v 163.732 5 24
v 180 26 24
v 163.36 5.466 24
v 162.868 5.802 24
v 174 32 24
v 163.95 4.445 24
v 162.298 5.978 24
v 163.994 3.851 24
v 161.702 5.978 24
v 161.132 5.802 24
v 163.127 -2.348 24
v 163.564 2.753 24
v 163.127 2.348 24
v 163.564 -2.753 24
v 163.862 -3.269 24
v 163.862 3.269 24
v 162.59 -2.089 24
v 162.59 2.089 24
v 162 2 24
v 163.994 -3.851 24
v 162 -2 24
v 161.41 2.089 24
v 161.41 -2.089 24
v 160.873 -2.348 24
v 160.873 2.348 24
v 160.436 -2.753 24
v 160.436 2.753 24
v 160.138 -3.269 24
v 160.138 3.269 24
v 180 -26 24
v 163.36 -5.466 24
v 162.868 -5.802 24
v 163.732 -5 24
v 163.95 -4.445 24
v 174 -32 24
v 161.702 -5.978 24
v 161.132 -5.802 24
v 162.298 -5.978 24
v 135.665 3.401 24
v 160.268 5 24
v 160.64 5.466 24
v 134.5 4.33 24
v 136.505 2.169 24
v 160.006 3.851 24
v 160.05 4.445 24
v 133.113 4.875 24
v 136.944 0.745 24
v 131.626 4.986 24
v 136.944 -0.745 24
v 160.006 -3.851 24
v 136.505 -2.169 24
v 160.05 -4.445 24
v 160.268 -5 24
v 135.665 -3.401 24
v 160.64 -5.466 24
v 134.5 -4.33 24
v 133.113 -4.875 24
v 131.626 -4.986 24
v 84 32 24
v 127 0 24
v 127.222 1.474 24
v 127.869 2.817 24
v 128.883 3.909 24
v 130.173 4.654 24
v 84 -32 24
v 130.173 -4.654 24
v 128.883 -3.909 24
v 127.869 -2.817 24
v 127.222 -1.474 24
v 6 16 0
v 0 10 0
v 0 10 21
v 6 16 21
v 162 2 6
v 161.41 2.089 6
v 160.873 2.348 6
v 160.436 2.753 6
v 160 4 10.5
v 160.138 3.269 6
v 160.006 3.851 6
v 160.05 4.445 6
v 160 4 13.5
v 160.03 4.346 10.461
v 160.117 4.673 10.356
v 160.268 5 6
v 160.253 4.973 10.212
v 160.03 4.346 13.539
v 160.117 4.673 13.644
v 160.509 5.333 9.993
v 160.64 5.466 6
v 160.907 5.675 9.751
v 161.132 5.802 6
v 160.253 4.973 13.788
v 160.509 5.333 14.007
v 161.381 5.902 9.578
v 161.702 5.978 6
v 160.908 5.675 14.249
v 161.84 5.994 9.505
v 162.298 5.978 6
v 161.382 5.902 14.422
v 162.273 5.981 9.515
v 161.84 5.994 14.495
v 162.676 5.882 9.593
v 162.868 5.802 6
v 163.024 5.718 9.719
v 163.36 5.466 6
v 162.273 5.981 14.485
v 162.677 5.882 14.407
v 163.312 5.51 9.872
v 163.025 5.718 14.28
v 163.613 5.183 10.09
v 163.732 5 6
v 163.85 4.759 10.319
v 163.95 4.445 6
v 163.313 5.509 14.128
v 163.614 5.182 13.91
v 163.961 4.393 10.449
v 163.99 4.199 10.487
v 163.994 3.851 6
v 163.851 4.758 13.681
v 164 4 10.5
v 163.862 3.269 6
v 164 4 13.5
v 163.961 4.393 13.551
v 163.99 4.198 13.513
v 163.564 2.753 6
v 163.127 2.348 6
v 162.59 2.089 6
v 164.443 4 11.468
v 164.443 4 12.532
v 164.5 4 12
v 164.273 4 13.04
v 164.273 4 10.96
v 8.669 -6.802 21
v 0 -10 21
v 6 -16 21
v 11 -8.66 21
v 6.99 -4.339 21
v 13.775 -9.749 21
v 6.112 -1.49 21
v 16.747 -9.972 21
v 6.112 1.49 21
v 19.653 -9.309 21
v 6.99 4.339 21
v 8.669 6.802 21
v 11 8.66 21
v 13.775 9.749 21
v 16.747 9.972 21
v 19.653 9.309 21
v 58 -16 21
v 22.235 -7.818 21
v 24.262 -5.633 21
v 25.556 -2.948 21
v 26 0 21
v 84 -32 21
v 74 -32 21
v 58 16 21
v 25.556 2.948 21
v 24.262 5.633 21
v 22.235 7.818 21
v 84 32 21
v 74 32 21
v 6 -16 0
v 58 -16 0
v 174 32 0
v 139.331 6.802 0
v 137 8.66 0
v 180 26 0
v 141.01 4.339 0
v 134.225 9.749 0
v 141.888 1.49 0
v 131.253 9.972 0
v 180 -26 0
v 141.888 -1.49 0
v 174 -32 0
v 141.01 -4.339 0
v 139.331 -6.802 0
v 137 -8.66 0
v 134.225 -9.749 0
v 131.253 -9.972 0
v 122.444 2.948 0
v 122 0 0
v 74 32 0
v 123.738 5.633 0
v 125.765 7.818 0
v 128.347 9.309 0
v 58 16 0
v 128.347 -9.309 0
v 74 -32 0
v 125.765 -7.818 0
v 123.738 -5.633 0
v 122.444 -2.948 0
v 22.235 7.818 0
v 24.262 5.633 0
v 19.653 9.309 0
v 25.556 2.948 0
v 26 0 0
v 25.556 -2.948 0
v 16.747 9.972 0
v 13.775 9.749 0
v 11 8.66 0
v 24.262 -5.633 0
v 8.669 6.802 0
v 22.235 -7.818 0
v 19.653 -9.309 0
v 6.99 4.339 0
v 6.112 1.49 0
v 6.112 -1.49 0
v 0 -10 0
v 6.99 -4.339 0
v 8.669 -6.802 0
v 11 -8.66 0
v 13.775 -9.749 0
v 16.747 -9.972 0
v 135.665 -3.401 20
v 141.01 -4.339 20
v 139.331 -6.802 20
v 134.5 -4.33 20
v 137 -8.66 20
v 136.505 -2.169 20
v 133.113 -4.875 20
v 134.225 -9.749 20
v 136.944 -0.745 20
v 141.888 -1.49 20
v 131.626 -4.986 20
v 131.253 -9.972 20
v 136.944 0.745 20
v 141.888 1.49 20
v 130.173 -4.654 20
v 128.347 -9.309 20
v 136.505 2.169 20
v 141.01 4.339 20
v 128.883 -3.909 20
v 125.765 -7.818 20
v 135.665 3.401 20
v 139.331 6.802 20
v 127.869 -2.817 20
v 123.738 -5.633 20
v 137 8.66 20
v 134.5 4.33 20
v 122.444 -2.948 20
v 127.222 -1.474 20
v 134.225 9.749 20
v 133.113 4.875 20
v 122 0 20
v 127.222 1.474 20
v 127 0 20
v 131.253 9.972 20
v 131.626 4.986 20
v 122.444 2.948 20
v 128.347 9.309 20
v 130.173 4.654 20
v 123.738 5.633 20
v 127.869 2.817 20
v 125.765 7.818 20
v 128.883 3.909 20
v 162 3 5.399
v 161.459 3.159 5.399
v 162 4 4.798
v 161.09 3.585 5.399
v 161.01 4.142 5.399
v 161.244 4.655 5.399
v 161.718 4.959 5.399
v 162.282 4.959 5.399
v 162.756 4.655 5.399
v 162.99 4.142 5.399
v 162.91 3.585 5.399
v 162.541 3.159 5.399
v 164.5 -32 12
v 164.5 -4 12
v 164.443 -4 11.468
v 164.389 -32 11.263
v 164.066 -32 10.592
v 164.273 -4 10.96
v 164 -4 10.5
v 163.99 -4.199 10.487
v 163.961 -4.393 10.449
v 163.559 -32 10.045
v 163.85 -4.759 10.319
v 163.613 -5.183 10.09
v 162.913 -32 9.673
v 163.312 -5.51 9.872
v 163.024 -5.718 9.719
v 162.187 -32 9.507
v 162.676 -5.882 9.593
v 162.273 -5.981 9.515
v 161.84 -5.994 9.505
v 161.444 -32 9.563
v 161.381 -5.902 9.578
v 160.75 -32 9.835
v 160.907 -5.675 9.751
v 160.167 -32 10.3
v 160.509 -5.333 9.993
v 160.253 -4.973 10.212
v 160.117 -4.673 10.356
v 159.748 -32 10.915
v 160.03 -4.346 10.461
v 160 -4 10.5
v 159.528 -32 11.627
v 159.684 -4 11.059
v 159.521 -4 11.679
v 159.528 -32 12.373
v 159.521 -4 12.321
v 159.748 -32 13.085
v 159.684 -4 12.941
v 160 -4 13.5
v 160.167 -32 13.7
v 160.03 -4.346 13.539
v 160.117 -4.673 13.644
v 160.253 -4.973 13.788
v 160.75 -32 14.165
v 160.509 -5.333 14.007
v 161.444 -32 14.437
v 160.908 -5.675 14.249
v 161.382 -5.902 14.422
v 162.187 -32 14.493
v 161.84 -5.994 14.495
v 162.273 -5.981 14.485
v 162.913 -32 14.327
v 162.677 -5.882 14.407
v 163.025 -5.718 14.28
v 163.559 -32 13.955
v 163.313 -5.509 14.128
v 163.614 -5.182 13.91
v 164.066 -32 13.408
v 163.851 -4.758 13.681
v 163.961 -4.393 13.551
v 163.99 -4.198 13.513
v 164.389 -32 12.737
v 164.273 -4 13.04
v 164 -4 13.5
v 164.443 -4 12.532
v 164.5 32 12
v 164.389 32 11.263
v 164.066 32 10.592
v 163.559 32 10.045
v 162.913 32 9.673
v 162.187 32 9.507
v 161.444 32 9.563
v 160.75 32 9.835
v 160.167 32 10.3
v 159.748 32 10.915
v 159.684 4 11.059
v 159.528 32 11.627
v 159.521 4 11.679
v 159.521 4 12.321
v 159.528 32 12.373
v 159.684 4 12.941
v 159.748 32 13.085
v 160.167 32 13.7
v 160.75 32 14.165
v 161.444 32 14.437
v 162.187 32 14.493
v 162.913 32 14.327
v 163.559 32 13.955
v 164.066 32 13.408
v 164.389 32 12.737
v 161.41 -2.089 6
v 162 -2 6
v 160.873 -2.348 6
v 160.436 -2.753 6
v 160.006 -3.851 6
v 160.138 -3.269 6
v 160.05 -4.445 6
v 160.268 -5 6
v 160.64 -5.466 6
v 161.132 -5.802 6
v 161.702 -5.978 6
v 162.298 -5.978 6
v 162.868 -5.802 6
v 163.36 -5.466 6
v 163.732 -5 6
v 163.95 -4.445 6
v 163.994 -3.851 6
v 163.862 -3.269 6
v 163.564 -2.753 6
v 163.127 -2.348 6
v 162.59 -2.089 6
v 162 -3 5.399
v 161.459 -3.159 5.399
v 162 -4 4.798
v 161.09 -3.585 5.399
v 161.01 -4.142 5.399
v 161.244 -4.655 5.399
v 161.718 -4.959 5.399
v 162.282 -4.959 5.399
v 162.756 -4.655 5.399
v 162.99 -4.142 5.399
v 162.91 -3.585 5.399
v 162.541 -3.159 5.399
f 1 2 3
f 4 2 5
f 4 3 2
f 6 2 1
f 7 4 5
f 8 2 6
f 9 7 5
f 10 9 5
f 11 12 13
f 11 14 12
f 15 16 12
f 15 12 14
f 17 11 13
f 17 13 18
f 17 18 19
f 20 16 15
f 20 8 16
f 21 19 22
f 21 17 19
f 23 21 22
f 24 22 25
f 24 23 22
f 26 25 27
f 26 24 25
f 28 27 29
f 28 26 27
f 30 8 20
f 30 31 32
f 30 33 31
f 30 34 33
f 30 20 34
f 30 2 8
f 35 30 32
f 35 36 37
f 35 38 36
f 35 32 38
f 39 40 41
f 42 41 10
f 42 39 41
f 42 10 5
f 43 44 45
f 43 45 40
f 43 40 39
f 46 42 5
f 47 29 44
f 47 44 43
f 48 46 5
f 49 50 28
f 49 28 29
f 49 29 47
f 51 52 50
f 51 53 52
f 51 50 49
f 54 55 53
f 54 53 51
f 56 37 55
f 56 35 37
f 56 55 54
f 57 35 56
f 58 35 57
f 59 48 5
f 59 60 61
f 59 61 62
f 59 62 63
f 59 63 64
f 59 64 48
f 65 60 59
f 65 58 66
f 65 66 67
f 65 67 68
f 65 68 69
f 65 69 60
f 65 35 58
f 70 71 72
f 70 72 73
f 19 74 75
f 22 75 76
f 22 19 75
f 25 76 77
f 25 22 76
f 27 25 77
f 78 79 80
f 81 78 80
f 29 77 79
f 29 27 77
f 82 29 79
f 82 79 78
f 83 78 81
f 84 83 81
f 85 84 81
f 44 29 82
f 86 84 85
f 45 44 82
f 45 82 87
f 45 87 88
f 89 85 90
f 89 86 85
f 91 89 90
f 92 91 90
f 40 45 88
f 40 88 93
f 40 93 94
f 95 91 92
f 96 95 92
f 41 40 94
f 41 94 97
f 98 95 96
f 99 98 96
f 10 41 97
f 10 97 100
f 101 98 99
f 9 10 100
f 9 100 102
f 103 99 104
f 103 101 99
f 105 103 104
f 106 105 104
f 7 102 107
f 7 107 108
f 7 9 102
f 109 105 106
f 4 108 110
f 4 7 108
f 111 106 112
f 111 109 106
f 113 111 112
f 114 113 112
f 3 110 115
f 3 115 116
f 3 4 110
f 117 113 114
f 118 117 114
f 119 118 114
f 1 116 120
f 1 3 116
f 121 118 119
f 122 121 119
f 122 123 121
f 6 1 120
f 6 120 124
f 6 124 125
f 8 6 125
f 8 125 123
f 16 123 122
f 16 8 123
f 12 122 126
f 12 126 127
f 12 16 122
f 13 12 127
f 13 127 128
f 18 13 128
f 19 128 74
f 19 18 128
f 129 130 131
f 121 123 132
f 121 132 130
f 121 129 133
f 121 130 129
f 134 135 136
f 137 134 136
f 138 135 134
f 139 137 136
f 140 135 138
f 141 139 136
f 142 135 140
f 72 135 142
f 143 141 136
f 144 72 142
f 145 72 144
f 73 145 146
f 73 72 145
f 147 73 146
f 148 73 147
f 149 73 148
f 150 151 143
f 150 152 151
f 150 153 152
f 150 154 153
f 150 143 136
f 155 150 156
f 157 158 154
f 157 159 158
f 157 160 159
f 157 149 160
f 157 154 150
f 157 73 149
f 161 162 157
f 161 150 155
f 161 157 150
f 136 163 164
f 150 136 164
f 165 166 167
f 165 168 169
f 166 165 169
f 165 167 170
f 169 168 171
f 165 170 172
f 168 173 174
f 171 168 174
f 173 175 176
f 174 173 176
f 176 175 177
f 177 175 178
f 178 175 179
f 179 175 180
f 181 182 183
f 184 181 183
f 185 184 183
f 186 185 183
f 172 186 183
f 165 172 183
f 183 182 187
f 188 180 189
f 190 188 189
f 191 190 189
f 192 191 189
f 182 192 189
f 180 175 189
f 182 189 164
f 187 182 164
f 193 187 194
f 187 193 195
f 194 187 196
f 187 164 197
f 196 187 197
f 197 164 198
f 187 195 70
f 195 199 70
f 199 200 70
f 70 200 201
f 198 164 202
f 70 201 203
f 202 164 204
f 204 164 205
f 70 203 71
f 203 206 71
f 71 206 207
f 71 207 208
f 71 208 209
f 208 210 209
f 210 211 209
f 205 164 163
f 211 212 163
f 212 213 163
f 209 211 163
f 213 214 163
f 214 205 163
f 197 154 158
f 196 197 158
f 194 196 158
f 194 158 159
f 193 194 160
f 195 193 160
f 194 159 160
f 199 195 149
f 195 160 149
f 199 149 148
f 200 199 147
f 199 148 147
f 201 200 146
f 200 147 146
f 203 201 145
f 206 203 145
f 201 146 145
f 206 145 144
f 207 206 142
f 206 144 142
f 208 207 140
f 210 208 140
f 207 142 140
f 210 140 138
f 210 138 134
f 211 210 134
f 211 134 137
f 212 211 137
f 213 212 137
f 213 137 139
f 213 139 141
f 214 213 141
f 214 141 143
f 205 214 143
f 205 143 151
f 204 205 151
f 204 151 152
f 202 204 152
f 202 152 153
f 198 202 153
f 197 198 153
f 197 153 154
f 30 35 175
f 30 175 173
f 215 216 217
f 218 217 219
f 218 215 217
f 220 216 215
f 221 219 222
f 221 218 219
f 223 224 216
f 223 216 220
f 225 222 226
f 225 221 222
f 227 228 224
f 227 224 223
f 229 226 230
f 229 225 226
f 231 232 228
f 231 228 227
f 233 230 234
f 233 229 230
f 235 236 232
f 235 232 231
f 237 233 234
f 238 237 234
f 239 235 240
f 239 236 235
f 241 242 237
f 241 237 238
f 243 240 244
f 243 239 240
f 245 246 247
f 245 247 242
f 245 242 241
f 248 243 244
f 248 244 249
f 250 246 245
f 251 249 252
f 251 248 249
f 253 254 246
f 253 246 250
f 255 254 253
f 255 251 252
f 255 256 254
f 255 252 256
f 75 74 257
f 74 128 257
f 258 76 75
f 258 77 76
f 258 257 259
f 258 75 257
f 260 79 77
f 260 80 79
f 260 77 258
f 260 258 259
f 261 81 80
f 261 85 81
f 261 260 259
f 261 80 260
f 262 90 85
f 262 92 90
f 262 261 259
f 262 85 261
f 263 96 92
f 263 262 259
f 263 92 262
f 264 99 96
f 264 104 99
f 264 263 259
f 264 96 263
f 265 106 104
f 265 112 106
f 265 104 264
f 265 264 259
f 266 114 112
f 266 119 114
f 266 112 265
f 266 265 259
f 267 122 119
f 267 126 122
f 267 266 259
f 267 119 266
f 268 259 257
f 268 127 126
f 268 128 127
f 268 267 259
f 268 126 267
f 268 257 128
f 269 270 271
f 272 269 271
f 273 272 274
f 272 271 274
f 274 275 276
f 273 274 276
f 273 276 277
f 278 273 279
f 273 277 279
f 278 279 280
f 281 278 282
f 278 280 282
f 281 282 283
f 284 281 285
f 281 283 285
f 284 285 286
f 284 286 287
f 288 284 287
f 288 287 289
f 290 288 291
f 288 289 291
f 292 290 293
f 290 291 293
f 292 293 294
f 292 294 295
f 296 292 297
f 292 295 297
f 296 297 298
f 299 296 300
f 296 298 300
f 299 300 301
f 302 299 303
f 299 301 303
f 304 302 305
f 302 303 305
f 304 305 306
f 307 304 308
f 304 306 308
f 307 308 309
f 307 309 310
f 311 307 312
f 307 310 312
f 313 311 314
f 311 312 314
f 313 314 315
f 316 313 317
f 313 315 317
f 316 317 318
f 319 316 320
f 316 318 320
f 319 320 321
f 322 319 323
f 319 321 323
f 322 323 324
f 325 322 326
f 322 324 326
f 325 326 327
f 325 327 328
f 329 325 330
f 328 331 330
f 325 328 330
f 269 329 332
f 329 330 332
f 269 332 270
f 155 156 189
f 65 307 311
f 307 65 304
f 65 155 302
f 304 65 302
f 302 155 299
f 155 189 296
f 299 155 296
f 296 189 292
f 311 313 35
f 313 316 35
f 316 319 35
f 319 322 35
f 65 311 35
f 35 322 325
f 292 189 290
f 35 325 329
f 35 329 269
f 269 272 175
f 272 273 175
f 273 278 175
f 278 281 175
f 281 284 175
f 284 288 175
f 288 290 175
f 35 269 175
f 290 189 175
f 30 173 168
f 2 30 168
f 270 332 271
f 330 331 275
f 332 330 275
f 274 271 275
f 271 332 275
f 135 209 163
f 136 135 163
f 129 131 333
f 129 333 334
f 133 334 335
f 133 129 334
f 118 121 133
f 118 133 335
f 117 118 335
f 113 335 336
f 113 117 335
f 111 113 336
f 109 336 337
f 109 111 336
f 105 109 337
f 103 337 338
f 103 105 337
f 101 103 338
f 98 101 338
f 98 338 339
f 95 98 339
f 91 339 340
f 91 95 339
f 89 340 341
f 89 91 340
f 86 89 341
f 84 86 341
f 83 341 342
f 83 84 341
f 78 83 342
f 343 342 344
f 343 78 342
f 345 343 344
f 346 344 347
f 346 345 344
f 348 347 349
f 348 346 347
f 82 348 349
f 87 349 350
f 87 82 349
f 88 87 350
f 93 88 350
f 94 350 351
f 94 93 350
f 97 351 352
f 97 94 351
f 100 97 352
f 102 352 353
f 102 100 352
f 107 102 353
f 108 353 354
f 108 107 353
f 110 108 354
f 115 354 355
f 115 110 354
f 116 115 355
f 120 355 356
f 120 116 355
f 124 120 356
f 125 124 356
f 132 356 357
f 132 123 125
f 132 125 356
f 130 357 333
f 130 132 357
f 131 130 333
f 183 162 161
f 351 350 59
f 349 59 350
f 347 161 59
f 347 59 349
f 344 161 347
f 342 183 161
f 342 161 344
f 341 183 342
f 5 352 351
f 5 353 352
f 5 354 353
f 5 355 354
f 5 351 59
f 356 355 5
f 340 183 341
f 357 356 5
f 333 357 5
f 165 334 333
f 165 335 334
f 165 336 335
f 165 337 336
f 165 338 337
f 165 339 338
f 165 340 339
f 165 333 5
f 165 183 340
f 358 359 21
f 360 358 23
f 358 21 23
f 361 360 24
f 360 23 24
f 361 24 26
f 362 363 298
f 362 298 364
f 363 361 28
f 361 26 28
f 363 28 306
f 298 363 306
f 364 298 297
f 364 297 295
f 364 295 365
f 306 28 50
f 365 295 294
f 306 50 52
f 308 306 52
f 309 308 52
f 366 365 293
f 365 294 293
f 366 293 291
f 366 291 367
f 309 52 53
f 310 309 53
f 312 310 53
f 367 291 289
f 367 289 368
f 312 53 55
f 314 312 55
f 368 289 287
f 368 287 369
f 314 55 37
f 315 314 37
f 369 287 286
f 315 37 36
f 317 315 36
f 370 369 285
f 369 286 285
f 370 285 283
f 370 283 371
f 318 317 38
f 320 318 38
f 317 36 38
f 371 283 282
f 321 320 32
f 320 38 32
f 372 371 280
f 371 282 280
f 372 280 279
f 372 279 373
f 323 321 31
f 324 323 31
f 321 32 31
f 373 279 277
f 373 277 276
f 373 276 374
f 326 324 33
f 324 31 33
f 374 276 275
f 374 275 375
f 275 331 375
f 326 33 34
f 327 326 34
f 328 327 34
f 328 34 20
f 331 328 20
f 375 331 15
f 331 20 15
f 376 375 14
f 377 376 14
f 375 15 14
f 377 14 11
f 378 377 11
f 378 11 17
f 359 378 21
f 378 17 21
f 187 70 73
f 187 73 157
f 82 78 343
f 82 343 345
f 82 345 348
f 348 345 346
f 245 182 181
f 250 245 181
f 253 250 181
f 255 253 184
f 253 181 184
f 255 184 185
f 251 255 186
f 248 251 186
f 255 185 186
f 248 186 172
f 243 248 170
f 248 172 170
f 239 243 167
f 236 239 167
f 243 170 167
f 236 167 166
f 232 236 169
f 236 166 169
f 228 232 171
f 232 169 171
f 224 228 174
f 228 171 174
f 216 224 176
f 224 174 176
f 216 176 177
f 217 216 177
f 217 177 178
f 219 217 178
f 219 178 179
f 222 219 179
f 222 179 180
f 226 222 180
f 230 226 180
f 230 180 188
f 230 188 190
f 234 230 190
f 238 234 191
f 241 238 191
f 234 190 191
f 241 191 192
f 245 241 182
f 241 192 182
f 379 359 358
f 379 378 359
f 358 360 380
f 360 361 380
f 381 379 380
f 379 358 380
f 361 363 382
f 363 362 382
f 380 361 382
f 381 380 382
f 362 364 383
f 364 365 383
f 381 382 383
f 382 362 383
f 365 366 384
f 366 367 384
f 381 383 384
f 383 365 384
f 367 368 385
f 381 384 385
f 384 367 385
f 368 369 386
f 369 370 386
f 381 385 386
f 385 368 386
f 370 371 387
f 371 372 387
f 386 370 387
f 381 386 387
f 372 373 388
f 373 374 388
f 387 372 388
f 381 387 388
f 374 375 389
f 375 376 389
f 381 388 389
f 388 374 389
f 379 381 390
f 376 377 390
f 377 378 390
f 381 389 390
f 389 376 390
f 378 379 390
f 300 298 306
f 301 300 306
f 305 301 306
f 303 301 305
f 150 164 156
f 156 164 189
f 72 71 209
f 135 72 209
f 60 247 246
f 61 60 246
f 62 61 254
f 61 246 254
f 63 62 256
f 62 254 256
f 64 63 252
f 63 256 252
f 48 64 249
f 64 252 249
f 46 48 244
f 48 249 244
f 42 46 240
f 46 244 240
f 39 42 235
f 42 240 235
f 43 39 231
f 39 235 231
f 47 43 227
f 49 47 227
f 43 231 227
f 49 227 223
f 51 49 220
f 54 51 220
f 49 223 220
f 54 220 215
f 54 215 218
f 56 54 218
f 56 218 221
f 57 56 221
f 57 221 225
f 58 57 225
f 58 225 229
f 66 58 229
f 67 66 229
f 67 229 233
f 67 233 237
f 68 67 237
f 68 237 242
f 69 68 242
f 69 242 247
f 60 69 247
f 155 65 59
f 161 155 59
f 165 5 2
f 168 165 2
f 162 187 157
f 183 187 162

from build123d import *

# Parameters (mm, degrees)
BOSS_EXTRU_1_DEPTH        = 24
TROU_START                = 4
TROU_TARAUD_M61_OUTLINE_R = 2.5
TROU_TARAUD_M61_DEPTH     = 28
ESQUISSE2_W               = 89
ESQUISSE2_H               = 84
ENL_V_MAT_EXTRU_1_DEPTH   = 3
ESQUISSE3_R               = 10
ENL_V_MAT_EXTRU_2_DEPTH   = 185.024454914
ESQUISSE9_R               = 10
ENL_V_MAT_EXTRU_3_DEPTH   = 20
ESQUISSE10_R              = 5
ENL_V_MAT_EXTRU_4_DEPTH   = 184.913022939


# Read off the part's stored shape, not the designer's step: Trou taraudé M61
with BuildPart() as part:
    # Esquisse1 → Boss.-Extru.1 (new body)
    with BuildSketch(Plane.XY):
        Polygon((0, 0), (0, 10), (6, 16), (58, 16), (74, 32), (174, 32), (180, 26), (180, 0), align=None)
    boss_extru_1 = extrude(amount=BOSS_EXTRU_1_DEPTH)

    # Esquisse5 → Dégagement M11 (revolve, cut)
    with BuildSketch(Plane(origin=(162, 4, 24), x_dir=(0, -1, 0), z_dir=(1, 0, 0))):
        Polygon((0, 0), (0, 19.201721238), (2, 18), (2, 0), align=None)
    d_gagement_m11 = revolve(axis=Axis((162, 4, 30.35), (0, 0, -1)), mode=Mode.SUBTRACT)

    # Trou taraudé M61 outline → Trou taraudé M61 (cut)
    with BuildSketch(Plane(origin=(0, 0, 0), x_dir=(1, 0, 0), z_dir=(0, 1, 0)).offset(TROU_START)):
        with Locations((162, -12)):
            Circle(TROU_TARAUD_M61_OUTLINE_R)
    trou_taraud_m61 = extrude(amount=TROU_TARAUD_M61_DEPTH, mode=Mode.SUBTRACT)

    # Symétrie1: Boss.-Extru.1, Dégagement M11, Trou taraudé M61 across Top Plane
    add(boss_extru_1.mirror(Plane(origin=(0, 0, 0), x_dir=(1, 0, 0), z_dir=(0, 1, 0))))
    add(d_gagement_m11.mirror(Plane(origin=(0, 0, 0), x_dir=(1, 0, 0), z_dir=(0, 1, 0))), mode=Mode.SUBTRACT)
    add(trou_taraud_m61.mirror(Plane(origin=(0, 0, 0), x_dir=(1, 0, 0), z_dir=(0, 1, 0))), mode=Mode.SUBTRACT)

    # Esquisse2 → Enlèv. mat.-Extru.1 (cut)
    with BuildSketch(Plane.XY.offset(24)):
        with Locations((39.5, 0)):
            Rectangle(ESQUISSE2_W, ESQUISSE2_H)
    extrude(amount=-ENL_V_MAT_EXTRU_1_DEPTH, mode=Mode.SUBTRACT)

    # Esquisse3 → Enlèv. mat.-Extru.2 (cut, through all)
    with BuildSketch(Plane.XY.offset(21)):
        with Locations((16, 0)):
            Circle(ESQUISSE3_R)
    extrude(amount=-ENL_V_MAT_EXTRU_2_DEPTH, mode=Mode.SUBTRACT)

    # Esquisse9 → Enlèv. mat.-Extru.3 (cut)
    with BuildSketch(Plane(origin=(0, 0, 0), x_dir=(-1, 0, 0), z_dir=(0, 0, -1))):
        with Locations((-132, 0)):
            Circle(ESQUISSE9_R)
    extrude(amount=-ENL_V_MAT_EXTRU_3_DEPTH, mode=Mode.SUBTRACT)

    # Esquisse10 → Enlèv. mat.-Extru.4 (cut, through all)
    with BuildSketch(Plane(origin=(0, 0, 20), x_dir=(-1, 0, 0), z_dir=(0, 0, -1))):
        with Locations((-132, 0)):
            Circle(ESQUISSE10_R)
    extrude(amount=-ENL_V_MAT_EXTRU_4_DEPTH, mode=Mode.SUBTRACT)


solid = part.part
